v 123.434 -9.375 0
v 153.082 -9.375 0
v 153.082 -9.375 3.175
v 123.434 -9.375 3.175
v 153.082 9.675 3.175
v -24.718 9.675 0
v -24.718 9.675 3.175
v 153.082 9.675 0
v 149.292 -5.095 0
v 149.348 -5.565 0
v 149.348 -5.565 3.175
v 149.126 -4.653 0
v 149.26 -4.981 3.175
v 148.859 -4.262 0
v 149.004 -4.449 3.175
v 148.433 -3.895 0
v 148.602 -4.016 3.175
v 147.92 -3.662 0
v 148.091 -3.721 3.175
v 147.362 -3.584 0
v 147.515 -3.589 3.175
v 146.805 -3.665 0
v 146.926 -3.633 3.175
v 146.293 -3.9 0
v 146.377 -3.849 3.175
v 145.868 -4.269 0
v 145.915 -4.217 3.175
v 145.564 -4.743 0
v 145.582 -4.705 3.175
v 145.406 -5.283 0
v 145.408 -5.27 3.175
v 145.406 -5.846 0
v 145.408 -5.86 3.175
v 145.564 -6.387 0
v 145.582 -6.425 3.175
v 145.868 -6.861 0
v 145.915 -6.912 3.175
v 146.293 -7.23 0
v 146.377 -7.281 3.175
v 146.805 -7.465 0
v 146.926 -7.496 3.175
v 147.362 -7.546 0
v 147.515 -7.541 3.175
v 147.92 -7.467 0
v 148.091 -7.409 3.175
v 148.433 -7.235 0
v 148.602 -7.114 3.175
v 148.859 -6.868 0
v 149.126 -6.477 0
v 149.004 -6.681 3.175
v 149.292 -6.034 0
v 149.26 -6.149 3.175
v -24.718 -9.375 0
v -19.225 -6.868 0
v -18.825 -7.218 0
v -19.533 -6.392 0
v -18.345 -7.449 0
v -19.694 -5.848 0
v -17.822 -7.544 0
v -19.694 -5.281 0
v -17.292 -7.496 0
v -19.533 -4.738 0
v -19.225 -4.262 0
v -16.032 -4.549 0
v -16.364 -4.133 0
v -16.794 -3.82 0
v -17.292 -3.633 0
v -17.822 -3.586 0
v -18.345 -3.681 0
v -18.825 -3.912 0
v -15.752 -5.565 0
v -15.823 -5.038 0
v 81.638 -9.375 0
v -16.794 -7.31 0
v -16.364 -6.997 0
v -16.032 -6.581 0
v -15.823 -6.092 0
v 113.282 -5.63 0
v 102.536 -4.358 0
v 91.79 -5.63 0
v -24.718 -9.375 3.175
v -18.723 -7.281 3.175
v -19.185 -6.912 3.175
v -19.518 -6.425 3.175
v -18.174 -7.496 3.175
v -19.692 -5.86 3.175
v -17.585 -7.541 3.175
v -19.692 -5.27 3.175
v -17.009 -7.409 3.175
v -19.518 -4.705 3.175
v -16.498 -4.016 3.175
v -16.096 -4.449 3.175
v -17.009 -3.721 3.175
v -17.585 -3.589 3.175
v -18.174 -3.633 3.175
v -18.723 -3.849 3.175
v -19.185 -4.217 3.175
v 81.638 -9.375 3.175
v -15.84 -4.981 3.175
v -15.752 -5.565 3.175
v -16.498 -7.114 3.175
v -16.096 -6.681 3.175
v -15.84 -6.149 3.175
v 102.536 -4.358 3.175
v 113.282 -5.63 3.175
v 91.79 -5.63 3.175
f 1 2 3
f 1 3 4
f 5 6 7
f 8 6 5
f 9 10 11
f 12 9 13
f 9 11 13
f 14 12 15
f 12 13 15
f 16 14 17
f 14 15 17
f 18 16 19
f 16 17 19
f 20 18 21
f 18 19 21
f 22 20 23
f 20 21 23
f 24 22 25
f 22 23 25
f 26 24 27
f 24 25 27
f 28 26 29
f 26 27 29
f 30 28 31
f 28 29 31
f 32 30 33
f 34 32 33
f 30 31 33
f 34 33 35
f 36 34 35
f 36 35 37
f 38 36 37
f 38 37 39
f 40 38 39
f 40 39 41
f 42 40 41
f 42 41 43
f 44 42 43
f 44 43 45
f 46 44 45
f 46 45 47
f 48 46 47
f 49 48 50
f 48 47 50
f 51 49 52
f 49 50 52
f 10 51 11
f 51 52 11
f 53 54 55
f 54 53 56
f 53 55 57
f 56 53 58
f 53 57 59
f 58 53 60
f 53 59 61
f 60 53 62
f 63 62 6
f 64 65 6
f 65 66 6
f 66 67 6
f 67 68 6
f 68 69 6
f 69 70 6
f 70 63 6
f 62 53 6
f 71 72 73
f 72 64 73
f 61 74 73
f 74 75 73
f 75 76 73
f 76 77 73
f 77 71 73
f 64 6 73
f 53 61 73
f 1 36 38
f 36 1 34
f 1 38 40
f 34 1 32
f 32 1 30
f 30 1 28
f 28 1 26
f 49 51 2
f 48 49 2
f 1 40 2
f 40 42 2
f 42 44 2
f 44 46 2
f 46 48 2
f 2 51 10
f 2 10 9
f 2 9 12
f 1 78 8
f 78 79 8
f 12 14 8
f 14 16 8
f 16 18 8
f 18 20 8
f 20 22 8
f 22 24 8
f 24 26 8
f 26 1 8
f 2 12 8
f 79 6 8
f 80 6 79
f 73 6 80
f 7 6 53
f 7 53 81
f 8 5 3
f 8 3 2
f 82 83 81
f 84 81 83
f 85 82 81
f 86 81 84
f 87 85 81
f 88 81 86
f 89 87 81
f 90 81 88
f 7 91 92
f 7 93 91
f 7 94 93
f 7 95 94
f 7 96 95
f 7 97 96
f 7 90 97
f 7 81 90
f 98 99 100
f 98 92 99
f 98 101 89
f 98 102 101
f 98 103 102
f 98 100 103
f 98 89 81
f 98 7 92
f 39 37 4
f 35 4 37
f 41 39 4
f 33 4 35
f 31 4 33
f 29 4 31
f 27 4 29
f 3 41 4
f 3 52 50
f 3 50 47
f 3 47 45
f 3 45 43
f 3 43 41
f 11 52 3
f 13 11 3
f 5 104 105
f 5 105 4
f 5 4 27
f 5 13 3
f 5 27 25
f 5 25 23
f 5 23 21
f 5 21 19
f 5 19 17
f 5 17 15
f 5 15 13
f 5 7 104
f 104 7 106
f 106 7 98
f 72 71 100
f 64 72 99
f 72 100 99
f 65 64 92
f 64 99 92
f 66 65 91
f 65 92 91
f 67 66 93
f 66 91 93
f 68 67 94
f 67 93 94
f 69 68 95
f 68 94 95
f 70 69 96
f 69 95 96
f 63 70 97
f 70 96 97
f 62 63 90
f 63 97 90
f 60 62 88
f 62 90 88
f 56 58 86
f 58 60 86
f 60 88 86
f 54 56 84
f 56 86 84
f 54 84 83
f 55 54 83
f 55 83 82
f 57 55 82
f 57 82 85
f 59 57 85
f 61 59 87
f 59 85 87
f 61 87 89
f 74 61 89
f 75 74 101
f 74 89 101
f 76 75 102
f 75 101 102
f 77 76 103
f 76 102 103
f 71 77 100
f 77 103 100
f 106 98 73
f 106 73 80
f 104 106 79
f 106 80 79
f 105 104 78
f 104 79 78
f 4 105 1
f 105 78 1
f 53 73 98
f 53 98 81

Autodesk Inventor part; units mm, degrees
ref_plane "YZ Plane" through (0, 0, 0) normal (1, 0, 0) x (0, 1, 0)
ref_plane "XZ Plane" through (0, 0, 0) normal (0, 1, 0) x (-1, 0, 0)
ref_plane "XY Plane" through (0, 0, 0) normal (0, 0, 1) x (1, 0, 0)
sketch "Sketch1" plane through (0, 0, 0) normal (0, 0, 1) x (1, 0, 0)
  line L0 (-27.2578, 3.3251) -> (156.8922, 3.3251)
  line L1 (156.8922, 3.3251) -> (156.8922, -9.3749)
  line L2 (156.8922, -9.3749) -> (-27.2578, -9.3749)
  line L3 (-27.2578, -9.3749) -> (-27.2578, 3.3251)
  line L4 (64.8172, -3.0249) -> (-20.7173, -3.0249)
  line L5 (-20.7173, -3.0249) -> (150.3517, -3.0249)
  line L6 (-20.7173, -3.0249) -> (-20.7173, -5.5649)
  circle A0 centre (-20.7173, -5.5649) radius 1.9812
  circle A1 centre (150.3517, -5.5649) radius 1.9812
  point P0 (0, 0)
  dimension "d0" = 184.15
  dimension "d1" = 12.7
  dimension "d2" = 85.5345
  dimension "d3" = 171.069
  dimension "d4" = 2.54
  dimension "d5" = 3.9624
extrude "Extrusion1" add sketch "Sketch1" along normal blind 3.175
sketch "Sketch2" plane through (-27.2578, 3.3251, 0) normal (0, 1, 0) x (1, 0, 0)
  line L0 (0, -3.175) -> (184.15, -3.175) projected
  line L1 (184.15, 0) -> (184.15, -3.175) projected
  line L2 (0, 0) -> (184.15, 0) projected
  line L3 (0, 0) -> (0, -3.175) projected
  point P0 (27.2578, 0)
extrude "Extrusion2" add sketch "Sketch2" along normal blind 6.35
sketch "Sketch3" plane through (0, 0, 3.175) normal (0, 0, 1) x (1, 0, 0)
  circle A0 centre (150.3517, -5.5649) radius 1.9812 projected
  circle A1 centre (-20.7173, -5.5649) radius 1.9812 projected
  point P0 (0, 0)
extrude "Extrusion3" add sketch "Sketch3" against normal blind 6.35
sketch "Sketch4" plane through (0, 0, 3.175) normal (0, 0, 1) x (1, 0, 0)
  line L0 (156.8922, -9.3749) -> (-27.2578, -9.3749) projected
  line L1 (64.8172, -9.3749) -> (64.8172, -5.5649)
  line L2 (64.8172, -5.5649) -> (-17.7328, -5.5649)
  circle A0 centre (-17.7328, -5.5649) radius 1.9812
  line L3 (-17.7328, -5.5649) -> (147.3672, -5.5649)
  circle A1 centre (147.3672, -5.5649) radius 1.9812
  point P0 (0, 0)
  dimension "d12" = 3.81
  dimension "d13" = 82.55
  dimension "d14" = 3.9624
  dimension "d15" = 165.1
extrude "Extrusion4" cut sketch "Sketch4" against normal blind 6.35
sketch "Sketch5" plane through (156.8922, -9.3749, 3.175) normal (1, 0, 0) x (0, 0, -1)
  line L0 (0, 19.05) -> (0, 0) projected
  line L1 (3.175, 0) -> (0, 0) projected
  line L2 (3.175, 19.05) -> (3.175, 0) projected
  line L3 (3.175, 19.05) -> (0, 19.05) projected
  point P0 (3.175, 9.3749)
extrude "Extrusion5" cut sketch "Sketch5" against normal blind 3.81
sketch "Sketch6" plane through (-27.2578, -9.3749, 0) normal (-1, 0, 0) x (0, 0, 1)
  line L0 (3.175, 0) -> (3.175, 19.05) projected
  line L1 (3.175, 19.05) -> (0, 19.05) projected
  line L2 (0, 0) -> (0, 19.05) projected
  line L3 (0, 0) -> (3.175, 0) projected
  point P0 (0, 9.3749)
extrude "Extrusion6" cut sketch "Sketch6" against normal blind 2.54
sketch "Sketch7" plane through (0, 0, -3.175) normal (0, 0, -1) x (-1, 0, 0)
  arc A0 (-148.8595, -4.2617) -> (-148.8595, -6.8681) centre (-147.3672, -5.5649) ccw projected
  arc A1 (-148.8595, -4.2617) -> (-148.8595, -6.8681) centre (-150.3517, -5.5649) ccw projected
  point P0 (0, 0)
extrude "Extrusion7" cut sketch "Sketch7" against normal blind 3.175
sketch "Sketch8" plane through (0, 0, -3.175) normal (0, 0, -1) x (-1, 0, 0)
  arc A0 (19.225, -6.8681) -> (19.225, -4.2617) centre (17.7328, -5.5649) ccw projected
  arc A1 (19.225, -6.8681) -> (19.225, -4.2617) centre (20.7173, -5.5649) ccw projected
  point P0 (0, 0)
extrude "Extrusion8" cut sketch "Sketch8" against normal blind 3.175
sketch "Sketch9" plane through (0, 0, 0) normal (0, 0, -1) x (-1, 0, 0)
  line L0 (-153.0822, -9.3749) -> (24.7178, -9.3749) projected
  circle A0 centre (-147.3672, -5.5649) radius 1.9812 projected
  line L1 (-147.3672, -5.5649) -> (-102.5362, -5.5649)
  line L2 (-102.5362, -5.5649) -> (-102.5362, -50.3959)
  circle A1 centre (-102.5362, -50.3959) radius 46.0375
  point P0 (0, 0)
  dimension "d26" = 44.831
  dimension "d27" = 44.831
  dimension "d28" = 92.075
extrude "Extrusion9" cut sketch "Sketch9" against normal blind 25.4 contours A1 L1 L2 L0 | L0 A1 | L2 L1 A1 L0
properties part number "small"
